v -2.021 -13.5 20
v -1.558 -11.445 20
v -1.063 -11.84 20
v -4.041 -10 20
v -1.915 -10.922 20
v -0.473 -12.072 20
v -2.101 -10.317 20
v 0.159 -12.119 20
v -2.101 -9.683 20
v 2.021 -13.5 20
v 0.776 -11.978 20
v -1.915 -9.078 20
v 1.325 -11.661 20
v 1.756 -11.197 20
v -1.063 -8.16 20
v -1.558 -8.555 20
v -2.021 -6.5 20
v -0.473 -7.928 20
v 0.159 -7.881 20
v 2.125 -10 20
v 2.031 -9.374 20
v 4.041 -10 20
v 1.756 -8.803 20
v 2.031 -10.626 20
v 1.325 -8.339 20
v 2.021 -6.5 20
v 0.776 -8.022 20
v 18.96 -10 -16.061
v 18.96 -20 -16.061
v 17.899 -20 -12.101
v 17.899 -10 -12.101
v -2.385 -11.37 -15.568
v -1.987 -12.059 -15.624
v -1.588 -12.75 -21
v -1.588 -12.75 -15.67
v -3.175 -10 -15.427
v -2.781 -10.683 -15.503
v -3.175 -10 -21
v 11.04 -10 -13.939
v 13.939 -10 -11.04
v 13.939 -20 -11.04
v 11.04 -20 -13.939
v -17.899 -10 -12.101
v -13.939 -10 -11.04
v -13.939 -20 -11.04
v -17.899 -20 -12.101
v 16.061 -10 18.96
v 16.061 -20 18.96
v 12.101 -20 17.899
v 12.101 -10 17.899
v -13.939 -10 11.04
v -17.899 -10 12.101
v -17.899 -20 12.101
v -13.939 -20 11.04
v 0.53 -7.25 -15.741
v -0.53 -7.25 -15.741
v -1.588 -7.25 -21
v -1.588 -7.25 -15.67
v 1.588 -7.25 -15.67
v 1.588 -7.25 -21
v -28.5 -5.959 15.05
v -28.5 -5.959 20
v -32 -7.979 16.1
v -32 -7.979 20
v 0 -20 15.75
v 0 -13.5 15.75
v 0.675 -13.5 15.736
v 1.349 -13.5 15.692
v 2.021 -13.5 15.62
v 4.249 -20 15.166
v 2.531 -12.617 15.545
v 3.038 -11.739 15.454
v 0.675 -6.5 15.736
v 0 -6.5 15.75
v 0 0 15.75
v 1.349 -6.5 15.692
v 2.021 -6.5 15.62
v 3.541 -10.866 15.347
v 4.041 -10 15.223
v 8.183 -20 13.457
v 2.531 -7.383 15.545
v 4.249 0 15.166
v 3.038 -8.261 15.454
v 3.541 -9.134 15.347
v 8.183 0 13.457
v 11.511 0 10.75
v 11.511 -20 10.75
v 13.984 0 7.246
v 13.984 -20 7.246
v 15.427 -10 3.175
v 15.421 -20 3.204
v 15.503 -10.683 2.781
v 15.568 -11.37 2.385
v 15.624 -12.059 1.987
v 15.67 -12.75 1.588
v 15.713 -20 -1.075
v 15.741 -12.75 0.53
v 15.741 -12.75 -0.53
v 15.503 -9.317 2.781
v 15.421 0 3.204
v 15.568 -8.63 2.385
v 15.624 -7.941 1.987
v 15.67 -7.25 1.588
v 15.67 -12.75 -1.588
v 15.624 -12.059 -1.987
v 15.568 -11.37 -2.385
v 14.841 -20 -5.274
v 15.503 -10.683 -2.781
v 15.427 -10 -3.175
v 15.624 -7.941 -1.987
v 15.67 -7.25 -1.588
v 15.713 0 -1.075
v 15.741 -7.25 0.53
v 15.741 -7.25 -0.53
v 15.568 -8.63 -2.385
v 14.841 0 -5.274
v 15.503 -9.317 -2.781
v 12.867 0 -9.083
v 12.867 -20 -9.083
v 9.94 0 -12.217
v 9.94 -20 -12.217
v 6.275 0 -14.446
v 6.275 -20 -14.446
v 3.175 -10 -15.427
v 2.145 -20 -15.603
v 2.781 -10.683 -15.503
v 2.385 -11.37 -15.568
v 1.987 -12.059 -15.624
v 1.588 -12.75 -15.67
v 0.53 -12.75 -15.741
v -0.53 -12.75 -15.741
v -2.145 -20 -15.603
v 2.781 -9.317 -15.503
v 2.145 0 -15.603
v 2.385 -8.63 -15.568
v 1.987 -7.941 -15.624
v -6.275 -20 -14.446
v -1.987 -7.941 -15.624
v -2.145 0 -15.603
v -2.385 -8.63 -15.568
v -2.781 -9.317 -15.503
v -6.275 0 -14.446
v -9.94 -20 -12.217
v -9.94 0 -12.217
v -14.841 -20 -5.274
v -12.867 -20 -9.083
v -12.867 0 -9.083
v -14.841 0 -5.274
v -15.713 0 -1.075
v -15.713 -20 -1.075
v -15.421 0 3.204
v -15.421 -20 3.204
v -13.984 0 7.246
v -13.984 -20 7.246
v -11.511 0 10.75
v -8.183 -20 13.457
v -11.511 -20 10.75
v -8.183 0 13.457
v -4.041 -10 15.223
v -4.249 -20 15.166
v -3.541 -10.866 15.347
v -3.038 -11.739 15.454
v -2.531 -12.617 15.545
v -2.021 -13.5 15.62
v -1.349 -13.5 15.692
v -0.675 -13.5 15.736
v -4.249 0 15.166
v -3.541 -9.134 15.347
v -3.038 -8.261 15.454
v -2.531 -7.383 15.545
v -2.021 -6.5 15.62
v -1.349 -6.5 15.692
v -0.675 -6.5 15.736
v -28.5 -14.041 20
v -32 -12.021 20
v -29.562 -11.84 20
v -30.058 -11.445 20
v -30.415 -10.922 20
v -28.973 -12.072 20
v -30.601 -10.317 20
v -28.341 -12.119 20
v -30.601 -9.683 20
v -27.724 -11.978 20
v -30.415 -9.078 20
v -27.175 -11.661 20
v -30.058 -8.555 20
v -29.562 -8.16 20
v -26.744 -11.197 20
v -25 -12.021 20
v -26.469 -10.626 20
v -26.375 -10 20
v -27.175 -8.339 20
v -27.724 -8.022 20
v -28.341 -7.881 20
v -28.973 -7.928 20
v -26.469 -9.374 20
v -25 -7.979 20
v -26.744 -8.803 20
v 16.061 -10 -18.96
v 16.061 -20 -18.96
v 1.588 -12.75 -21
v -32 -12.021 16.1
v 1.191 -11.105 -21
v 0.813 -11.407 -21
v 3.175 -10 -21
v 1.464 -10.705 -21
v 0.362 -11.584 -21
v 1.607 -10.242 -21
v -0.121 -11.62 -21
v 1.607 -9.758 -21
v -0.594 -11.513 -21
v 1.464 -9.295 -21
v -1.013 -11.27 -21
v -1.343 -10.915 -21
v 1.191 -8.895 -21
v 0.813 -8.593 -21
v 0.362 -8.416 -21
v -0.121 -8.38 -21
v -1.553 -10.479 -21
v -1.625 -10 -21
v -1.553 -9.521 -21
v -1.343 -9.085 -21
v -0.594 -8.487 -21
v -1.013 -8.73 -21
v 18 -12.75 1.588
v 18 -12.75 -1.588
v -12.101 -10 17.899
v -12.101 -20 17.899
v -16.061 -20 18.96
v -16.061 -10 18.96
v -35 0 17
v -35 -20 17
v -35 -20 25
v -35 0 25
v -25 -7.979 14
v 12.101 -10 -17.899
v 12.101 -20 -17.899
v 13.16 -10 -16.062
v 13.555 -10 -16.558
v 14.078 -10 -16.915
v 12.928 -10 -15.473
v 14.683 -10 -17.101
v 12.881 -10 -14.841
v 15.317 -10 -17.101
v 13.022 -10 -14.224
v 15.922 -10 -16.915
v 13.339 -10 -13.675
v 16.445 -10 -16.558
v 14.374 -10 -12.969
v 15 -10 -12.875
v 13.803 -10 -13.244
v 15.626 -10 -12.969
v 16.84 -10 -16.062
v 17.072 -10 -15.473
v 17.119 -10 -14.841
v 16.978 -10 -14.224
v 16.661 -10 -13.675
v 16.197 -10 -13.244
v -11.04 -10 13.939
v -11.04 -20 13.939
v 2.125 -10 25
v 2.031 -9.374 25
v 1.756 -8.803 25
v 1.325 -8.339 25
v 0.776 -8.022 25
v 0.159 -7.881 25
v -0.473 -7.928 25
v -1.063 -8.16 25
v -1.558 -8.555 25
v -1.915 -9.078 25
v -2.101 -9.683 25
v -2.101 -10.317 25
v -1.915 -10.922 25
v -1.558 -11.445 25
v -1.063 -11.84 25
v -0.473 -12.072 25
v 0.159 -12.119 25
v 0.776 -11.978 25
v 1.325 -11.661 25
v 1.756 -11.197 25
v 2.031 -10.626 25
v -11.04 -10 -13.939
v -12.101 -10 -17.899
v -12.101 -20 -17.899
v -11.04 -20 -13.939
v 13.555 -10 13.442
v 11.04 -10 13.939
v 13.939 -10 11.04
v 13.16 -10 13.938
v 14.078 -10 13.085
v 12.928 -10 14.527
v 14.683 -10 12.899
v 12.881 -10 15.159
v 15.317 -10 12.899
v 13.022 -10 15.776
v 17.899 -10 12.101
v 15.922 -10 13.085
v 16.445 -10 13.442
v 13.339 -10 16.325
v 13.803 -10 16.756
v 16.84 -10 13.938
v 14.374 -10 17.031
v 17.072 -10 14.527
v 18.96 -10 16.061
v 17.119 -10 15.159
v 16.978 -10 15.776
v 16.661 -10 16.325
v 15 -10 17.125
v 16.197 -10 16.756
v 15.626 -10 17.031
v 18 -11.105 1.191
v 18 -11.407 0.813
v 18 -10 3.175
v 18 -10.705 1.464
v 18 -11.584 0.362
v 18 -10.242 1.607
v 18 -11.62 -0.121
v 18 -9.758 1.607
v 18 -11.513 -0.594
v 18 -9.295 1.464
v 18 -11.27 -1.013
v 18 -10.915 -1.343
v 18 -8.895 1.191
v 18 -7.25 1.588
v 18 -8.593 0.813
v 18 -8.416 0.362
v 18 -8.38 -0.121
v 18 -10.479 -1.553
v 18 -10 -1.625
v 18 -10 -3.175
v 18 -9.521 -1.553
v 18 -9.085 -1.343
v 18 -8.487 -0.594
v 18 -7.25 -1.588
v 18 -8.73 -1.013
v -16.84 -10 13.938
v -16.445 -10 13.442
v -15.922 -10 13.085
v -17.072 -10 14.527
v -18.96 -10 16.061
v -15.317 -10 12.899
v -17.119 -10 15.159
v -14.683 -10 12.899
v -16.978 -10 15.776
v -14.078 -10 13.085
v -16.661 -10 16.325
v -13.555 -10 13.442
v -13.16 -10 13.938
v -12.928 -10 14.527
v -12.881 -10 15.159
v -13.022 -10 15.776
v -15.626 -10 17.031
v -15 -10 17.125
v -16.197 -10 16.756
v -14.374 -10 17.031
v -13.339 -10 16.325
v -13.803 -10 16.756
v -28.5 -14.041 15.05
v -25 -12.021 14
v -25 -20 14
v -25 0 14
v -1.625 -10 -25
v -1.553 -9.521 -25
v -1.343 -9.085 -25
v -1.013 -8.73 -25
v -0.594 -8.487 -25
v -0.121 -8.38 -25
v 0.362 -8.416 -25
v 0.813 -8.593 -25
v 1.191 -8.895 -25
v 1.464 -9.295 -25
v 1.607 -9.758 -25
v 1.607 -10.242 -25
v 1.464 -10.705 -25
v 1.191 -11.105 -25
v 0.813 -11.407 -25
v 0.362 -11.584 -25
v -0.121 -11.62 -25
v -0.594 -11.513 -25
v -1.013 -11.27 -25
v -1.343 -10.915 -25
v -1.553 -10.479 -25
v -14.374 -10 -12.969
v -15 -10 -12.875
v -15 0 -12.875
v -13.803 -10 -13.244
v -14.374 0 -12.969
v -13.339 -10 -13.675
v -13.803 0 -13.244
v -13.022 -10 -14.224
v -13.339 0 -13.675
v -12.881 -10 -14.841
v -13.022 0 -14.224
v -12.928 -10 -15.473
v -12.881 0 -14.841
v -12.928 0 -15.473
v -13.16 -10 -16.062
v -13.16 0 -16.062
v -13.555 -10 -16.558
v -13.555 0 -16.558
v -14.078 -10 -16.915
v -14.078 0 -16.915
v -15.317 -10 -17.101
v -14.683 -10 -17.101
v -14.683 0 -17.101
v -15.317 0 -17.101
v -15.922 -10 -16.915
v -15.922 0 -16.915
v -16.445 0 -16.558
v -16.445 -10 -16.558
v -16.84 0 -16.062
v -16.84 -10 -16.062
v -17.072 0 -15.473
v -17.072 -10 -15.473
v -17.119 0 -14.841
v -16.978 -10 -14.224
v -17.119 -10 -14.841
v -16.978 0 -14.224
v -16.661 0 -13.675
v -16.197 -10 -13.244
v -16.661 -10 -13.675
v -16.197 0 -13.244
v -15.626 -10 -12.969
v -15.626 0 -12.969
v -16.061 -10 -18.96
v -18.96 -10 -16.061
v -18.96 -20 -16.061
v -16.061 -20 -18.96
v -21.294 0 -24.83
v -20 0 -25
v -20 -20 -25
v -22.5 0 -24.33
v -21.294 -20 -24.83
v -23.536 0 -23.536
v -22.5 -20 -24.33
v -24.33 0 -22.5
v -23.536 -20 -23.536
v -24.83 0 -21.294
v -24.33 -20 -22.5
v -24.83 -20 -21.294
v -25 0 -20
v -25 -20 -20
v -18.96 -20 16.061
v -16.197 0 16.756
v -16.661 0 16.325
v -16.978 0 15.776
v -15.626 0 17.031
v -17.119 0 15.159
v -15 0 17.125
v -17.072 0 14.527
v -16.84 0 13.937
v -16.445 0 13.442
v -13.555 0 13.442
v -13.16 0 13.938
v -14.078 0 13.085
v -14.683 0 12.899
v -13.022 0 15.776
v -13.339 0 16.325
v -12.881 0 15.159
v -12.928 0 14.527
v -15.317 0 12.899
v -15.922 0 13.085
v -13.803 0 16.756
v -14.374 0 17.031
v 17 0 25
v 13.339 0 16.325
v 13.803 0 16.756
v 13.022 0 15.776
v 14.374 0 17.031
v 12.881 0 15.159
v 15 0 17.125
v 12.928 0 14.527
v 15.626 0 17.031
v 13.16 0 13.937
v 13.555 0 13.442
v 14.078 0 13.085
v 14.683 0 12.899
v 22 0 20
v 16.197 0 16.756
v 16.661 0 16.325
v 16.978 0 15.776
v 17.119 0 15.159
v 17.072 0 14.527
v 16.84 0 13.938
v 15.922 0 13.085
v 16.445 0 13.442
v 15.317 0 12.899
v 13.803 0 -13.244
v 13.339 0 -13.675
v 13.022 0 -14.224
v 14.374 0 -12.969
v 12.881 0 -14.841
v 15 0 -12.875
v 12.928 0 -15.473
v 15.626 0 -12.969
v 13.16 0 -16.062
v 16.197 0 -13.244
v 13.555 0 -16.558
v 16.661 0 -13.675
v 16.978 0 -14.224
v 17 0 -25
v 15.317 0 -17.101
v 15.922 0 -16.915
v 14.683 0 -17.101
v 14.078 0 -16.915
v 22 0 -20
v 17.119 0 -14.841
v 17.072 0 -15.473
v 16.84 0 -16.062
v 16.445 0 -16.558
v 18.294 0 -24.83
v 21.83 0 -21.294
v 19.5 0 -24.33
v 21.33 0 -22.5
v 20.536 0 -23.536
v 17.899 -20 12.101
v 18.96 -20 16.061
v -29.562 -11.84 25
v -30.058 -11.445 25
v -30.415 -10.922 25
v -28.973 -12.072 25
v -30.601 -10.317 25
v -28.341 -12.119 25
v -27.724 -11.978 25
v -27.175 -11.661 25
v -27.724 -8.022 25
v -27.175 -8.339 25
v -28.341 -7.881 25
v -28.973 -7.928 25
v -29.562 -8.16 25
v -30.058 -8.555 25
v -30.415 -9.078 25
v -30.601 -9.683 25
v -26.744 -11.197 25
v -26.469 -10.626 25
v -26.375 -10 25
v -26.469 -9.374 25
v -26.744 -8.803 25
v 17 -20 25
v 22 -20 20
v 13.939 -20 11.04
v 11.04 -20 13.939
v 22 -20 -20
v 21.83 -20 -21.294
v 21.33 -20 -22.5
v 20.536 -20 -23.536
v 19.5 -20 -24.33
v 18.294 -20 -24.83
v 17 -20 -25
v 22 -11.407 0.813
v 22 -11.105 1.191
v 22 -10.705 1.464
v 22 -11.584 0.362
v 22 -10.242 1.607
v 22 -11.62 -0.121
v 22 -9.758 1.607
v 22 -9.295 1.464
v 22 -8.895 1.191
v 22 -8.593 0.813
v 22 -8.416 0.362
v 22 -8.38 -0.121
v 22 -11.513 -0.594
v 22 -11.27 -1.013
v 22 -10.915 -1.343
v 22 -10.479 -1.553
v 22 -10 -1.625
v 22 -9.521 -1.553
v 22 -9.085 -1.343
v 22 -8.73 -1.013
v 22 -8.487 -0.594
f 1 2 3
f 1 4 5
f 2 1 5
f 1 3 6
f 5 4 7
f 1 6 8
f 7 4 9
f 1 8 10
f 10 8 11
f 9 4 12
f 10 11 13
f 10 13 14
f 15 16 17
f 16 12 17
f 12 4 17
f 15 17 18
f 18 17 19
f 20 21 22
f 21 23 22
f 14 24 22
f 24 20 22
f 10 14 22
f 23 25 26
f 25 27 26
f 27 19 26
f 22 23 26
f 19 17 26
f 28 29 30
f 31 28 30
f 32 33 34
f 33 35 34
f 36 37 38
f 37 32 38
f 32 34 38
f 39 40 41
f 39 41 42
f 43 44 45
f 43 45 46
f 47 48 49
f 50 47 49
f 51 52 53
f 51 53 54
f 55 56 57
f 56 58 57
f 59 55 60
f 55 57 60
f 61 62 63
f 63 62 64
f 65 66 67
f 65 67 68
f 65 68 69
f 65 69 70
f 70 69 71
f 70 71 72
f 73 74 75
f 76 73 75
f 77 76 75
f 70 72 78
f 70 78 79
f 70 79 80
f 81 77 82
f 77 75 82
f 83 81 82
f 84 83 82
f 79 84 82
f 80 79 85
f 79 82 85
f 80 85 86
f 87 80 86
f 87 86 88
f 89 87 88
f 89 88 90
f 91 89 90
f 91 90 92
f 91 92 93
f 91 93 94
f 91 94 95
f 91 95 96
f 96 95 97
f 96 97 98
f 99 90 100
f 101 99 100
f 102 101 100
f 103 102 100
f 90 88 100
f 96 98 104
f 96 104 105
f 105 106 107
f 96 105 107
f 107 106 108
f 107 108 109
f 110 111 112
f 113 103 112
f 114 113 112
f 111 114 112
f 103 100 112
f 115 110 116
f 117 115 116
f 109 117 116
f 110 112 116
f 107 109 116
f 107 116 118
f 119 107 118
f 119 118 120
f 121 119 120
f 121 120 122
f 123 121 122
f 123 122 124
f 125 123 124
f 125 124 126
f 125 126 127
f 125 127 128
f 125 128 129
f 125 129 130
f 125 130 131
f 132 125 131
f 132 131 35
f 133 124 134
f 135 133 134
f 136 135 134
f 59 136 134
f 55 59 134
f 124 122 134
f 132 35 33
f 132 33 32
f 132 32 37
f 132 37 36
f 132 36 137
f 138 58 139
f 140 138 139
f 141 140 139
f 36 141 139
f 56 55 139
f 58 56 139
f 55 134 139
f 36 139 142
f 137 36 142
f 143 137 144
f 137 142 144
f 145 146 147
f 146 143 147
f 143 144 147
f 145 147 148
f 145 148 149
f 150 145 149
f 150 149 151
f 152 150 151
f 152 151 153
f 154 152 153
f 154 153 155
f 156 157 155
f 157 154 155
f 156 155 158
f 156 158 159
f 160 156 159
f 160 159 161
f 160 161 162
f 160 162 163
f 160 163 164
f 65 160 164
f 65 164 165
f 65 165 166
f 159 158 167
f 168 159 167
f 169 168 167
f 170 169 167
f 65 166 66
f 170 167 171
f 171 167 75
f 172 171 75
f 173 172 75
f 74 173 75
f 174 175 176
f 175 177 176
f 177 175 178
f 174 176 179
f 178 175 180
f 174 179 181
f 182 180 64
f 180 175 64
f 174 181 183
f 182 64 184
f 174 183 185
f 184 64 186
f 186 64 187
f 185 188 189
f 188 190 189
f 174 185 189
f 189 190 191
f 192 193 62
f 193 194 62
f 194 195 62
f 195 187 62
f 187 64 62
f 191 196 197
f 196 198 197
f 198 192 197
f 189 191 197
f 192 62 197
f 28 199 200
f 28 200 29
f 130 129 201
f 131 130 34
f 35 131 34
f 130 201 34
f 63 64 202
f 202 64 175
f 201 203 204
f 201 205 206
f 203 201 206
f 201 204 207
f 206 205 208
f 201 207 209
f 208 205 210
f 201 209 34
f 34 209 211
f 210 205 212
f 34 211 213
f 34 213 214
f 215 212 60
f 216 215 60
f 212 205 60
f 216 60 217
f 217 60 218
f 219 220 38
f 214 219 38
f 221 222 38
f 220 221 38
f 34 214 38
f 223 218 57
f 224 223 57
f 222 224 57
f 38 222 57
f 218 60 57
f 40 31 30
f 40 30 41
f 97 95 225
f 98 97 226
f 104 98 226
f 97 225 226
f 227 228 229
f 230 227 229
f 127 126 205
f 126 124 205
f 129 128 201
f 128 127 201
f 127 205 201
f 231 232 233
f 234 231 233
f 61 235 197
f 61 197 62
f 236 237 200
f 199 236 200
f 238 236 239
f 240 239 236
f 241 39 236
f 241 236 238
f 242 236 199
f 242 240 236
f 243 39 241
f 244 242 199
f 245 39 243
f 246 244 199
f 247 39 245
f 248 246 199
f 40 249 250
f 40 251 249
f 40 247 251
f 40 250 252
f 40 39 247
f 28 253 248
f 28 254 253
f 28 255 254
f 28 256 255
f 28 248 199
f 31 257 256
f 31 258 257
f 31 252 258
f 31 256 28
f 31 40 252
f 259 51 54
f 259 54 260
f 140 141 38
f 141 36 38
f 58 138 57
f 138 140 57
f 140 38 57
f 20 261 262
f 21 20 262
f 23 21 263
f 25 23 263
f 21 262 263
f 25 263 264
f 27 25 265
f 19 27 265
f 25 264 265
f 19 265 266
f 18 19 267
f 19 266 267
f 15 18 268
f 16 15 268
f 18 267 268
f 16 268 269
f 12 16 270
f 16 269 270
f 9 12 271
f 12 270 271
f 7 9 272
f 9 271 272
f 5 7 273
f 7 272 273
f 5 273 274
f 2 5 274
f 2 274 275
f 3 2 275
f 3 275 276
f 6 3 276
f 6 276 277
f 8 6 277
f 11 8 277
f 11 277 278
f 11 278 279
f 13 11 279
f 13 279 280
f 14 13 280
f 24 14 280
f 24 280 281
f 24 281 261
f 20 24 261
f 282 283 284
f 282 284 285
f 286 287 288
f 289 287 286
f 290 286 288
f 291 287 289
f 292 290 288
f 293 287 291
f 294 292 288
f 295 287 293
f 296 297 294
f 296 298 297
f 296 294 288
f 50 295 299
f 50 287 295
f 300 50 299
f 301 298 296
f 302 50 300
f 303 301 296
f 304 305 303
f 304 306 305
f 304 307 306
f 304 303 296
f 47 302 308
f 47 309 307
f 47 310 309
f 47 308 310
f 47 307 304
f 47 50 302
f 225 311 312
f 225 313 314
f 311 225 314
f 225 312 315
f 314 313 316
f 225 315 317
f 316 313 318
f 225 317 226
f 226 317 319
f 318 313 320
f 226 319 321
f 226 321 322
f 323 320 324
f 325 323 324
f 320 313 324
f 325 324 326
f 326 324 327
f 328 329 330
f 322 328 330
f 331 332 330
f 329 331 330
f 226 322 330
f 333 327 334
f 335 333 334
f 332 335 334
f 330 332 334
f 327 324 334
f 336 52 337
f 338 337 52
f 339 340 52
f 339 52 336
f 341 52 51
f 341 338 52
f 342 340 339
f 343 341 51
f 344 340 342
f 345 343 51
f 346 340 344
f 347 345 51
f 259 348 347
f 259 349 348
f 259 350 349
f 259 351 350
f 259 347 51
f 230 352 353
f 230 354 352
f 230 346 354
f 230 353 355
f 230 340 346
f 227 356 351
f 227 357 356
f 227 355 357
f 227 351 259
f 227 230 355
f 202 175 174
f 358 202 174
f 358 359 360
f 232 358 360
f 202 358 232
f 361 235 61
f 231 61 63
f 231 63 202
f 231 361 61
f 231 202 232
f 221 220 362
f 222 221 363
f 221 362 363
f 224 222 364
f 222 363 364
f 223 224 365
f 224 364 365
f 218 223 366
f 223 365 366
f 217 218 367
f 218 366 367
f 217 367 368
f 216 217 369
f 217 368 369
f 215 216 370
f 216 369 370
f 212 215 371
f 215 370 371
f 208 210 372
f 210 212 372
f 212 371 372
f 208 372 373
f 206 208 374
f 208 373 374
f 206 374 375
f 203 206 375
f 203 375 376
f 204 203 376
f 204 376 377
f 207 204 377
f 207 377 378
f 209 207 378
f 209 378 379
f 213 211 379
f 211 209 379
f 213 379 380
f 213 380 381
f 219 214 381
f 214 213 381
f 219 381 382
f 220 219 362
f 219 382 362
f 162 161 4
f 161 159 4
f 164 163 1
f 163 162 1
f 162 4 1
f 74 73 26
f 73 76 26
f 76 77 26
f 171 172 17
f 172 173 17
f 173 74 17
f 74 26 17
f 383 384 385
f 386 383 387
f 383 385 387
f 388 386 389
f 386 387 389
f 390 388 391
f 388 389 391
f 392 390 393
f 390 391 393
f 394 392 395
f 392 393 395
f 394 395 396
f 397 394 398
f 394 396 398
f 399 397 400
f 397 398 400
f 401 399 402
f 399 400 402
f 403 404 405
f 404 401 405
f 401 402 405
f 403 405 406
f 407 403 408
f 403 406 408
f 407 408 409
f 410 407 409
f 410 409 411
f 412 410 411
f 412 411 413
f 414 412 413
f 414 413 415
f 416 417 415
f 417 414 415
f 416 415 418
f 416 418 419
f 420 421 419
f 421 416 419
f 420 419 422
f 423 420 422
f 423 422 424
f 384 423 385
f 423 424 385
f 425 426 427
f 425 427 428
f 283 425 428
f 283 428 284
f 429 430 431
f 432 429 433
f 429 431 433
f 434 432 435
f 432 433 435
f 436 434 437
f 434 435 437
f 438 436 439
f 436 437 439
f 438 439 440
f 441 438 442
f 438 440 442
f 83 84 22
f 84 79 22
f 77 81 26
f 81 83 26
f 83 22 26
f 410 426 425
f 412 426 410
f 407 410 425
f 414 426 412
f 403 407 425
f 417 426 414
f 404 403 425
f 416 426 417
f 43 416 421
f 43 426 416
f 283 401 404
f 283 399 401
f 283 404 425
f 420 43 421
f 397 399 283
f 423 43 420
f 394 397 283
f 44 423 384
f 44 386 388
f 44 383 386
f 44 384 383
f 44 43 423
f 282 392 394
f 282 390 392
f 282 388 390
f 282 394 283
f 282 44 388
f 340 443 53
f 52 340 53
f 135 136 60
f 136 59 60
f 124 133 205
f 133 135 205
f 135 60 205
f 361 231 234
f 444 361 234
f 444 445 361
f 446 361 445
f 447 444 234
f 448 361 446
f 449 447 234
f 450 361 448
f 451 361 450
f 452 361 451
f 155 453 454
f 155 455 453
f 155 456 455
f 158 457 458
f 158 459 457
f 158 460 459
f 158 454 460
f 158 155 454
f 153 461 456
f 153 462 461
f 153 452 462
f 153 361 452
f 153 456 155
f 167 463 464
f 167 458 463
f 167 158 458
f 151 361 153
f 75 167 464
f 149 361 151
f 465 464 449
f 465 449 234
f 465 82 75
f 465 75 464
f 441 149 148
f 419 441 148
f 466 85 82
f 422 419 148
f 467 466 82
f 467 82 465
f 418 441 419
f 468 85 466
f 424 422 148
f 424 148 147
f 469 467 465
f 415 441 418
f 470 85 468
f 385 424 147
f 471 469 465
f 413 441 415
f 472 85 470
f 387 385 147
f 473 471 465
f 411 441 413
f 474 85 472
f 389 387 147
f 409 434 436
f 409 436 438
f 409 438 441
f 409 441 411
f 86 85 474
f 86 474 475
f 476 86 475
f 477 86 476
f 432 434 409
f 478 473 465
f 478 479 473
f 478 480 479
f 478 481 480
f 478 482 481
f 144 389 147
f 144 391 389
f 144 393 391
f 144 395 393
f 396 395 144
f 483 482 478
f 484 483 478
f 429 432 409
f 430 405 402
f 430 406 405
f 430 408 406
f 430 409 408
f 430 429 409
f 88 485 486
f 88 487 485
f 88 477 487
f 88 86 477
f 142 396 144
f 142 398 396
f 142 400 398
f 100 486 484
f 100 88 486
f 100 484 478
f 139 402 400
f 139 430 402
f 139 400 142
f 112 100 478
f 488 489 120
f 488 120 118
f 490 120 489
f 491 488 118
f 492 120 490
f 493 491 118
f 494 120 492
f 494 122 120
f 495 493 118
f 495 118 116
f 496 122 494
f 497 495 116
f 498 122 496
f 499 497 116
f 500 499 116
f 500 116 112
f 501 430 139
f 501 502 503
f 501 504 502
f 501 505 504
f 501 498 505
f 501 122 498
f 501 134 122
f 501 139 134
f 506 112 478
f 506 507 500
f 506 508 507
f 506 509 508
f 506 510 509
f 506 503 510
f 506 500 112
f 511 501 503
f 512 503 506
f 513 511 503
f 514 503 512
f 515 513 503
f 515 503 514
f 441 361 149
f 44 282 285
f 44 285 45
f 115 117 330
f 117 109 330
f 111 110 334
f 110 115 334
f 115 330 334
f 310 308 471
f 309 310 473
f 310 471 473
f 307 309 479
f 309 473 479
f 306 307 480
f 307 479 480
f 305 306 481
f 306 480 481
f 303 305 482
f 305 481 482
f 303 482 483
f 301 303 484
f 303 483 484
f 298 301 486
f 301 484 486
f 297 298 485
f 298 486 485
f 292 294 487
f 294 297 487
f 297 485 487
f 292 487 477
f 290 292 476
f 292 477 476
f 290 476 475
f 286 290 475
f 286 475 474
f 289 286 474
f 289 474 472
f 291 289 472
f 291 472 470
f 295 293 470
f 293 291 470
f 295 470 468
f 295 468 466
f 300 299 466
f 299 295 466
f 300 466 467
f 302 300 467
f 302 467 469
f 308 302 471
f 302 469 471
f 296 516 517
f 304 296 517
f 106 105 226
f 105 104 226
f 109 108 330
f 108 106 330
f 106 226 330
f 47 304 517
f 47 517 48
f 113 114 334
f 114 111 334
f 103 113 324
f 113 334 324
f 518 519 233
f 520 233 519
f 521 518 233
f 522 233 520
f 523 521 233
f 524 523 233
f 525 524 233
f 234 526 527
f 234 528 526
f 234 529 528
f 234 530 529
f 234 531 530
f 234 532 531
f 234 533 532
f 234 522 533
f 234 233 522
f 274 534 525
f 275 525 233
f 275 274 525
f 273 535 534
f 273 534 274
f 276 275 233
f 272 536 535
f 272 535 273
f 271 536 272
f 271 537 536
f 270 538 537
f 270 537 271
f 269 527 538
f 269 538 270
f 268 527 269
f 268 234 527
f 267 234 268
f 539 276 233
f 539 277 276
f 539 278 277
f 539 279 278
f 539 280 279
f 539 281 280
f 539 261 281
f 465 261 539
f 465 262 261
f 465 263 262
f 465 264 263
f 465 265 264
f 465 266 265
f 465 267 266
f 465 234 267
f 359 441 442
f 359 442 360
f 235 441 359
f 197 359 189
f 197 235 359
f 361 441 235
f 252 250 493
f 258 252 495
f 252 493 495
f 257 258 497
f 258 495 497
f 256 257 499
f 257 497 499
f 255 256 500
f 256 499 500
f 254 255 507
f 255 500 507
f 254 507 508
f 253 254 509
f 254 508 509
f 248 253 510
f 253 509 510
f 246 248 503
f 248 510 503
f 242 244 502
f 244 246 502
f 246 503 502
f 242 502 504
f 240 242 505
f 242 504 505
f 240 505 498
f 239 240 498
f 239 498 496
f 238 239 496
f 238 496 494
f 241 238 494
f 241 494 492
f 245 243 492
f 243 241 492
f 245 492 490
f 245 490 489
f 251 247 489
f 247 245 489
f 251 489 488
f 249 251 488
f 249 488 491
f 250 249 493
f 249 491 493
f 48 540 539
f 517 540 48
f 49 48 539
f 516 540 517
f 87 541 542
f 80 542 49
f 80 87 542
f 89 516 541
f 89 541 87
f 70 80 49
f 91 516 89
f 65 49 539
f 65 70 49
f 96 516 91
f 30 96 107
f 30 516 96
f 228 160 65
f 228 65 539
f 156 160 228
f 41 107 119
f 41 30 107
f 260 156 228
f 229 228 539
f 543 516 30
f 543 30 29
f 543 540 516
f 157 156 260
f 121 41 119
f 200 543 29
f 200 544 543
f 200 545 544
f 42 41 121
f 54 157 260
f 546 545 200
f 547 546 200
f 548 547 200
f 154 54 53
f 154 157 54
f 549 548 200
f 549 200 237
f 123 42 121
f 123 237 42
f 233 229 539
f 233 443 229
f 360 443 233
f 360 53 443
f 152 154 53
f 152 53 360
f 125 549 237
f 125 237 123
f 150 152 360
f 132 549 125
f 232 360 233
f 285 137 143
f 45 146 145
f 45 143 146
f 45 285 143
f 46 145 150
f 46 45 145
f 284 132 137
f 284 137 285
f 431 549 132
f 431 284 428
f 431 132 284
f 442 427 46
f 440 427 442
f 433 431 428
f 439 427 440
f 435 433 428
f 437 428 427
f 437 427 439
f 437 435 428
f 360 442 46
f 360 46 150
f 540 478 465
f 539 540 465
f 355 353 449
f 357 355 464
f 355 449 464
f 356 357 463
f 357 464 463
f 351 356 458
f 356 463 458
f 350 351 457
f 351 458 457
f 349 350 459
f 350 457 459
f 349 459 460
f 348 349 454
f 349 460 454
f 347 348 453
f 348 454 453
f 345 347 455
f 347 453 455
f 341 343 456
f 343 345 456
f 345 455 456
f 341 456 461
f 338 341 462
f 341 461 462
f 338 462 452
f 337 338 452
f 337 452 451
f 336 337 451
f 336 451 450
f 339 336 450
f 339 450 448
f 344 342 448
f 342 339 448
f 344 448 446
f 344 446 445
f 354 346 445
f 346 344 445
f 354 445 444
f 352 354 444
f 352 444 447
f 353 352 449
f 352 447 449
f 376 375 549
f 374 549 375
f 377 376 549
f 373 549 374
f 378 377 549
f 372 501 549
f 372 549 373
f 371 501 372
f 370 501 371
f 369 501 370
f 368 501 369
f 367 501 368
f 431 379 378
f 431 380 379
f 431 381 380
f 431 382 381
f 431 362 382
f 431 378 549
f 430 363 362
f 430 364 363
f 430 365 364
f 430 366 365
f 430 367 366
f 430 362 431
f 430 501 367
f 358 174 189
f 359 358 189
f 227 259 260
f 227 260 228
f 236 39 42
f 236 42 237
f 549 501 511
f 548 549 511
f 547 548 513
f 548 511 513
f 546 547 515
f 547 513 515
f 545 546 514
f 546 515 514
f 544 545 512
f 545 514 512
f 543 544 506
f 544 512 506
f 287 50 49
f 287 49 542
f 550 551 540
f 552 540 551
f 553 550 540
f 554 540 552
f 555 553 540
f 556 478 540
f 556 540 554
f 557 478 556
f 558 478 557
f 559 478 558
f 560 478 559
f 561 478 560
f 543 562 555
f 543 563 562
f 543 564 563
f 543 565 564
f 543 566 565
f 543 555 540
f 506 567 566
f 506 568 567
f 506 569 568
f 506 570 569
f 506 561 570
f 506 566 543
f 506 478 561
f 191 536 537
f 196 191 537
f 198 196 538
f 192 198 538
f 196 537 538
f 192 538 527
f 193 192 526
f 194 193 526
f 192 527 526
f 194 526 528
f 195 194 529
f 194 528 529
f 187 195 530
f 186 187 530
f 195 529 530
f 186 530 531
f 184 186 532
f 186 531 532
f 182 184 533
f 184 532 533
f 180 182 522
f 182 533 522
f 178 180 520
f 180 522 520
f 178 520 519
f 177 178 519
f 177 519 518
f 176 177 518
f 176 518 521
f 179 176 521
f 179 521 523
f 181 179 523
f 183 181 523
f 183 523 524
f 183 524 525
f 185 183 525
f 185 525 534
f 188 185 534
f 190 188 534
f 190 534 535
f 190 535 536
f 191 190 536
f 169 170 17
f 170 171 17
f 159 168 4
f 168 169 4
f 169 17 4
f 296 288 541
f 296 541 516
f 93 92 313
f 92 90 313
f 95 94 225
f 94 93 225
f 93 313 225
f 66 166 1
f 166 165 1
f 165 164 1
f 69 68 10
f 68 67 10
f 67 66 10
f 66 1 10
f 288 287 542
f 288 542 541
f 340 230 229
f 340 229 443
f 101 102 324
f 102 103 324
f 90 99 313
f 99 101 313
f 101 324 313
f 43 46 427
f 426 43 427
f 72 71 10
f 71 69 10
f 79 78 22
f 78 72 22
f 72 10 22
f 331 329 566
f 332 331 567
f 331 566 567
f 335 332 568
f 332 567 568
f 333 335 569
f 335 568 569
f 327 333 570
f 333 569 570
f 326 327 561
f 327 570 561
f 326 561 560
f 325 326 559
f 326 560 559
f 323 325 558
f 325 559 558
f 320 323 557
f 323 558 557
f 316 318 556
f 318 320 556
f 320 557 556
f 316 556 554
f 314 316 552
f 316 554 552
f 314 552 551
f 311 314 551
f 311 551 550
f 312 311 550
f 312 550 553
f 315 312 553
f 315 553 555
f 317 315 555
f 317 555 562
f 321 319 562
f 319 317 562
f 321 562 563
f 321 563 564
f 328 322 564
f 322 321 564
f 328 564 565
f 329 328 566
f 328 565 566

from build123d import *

# Parameters (mm, degrees)
CROQUIS1_R               = 2.125
CROQUIS1_R_2             = 15.75
SALIENTE_EXTRUIR1_DEPTH  = 20
CORTAR_EXTRUIR1_REACH    = 66.226
CROQUIS3_R               = 2.125
CORTAR_EXTRUIR2_REACH    = 71.226
CORTAR_EXTRUIR2_START    = -5
CORTAR_EXTRUIR3_DEPTH    = 10
SKETCH1_W                = 3
SKETCH1_H                = 60
CUT_EXTRUDE1_DEPTH       = 48.434164903
REDONDEO1_R              = 5
CUT_EXTRUDE2_DEPTH       = 48.434164903
SKETCH3_R                = 1.625
CUT_EXTRUDE3_DEPTH       = 10
CUT_EXTRUDE4_REACH       = 71.376
CUT_EXTRUDE4_END_RADIUS  = 15.75
CUT_EXTRUDE4_START       = -4
CUT_EXTRUDE5_REACH       = 66.226
CUT_EXTRUDE5_END_RADIUS  = 15.75
SKETCH5_R                = 1.625
CUT_EXTRUDE6_REACH       = 70.226
CUT_EXTRUDE6_END_RADIUS  = 15.75
CUT_EXTRUDE6_START       = -4
REDONDEO1_OF_SIMETR_A1_R = 5
CROQUIS6_W               = 57
CROQUIS6_H               = 20
CORTAR_EXTRUIR4_DEPTH    = 73.972597597
CROQUIS7_W               = 57
CROQUIS7_H               = 20
CORTAR_EXTRUIR5_DEPTH    = 73.972597597


with BuildPart() as part:
    # Croquis1 → Saliente-Extruir1 (new body)
    with BuildSketch(Plane(origin=(0, 0, 0), x_dir=(1, 0, 0), z_dir=(0, 1, 0))):
        Polygon((25, 25), (-25, 25), (-25, -14), (-35, -17), (-35, -25), (25, -25), align=None)
        with Locations(Location((-15, -15, 0), (0, 0, 270))):
            Circle(CROQUIS1_R, mode=Mode.SUBTRACT)
        with Locations(Location((15, -15, 0), (0, 0, 270))):
            Circle(CROQUIS1_R, mode=Mode.SUBTRACT)
        with Locations(Location((-15, 15, 0), (0, 0, 270))):
            Circle(CROQUIS1_R, mode=Mode.SUBTRACT)
        with Locations(Location((0, 0, 0), (0, 0, 270))):
            Circle(CROQUIS1_R_2, mode=Mode.SUBTRACT)
        with Locations(Location((15, 15, 0), (0, 0, 270))):
            Circle(CROQUIS1_R, mode=Mode.SUBTRACT)
    saliente_extruir1 = extrude(amount=-SALIENTE_EXTRUIR1_DEPTH)

    # Croquis3 → Cortar-Extruir1 (cut, up to next)
    with BuildSketch(Plane.XY.offset(25), mode=Mode.PRIVATE) as cortar_extruir1_sk1:
        with Locations((-28.5, -10)):
            Circle(CROQUIS3_R)
    cortar_extruir1_tool1 = extrude(cortar_extruir1_sk1.sketch, amount=-CORTAR_EXTRUIR1_REACH, mode=Mode.PRIVATE) & part.part
    # Croquis3 → Cortar-Extruir1 (cut, up to next)
    with BuildSketch(Plane.XY.offset(25), mode=Mode.PRIVATE) as cortar_extruir1_sk2:
        with Locations((0, -10)):
            Circle(CROQUIS3_R)
    cortar_extruir1_tool2 = extrude(cortar_extruir1_sk2.sketch, amount=-CORTAR_EXTRUIR1_REACH, mode=Mode.PRIVATE) & part.part
    cortar_extruir1_1 = cortar_extruir1_tool1.solids().sort_by_distance((-28.5, -10, 25))[0]
    add(cortar_extruir1_1, mode=Mode.SUBTRACT)
    cortar_extruir1_2 = cortar_extruir1_tool2.solids().sort_by_distance((0, -10, 25))[0]
    add(cortar_extruir1_2, mode=Mode.SUBTRACT)
    cortar_extruir1 = cortar_extruir1_1 + cortar_extruir1_2  # Cortar-Extruir1 as one shape, for the pattern or mirror that repeats it

    # Croquis4 → Cortar-Extruir2 (cut, up to next)
    with BuildSketch(Plane.XY.offset(25).offset(CORTAR_EXTRUIR2_START), mode=Mode.PRIVATE) as cortar_extruir2_sk1:
        Polygon((-28.5, -14.041451884), (-25, -12.020725942), (-25, -7.979274058), (-28.5, -5.958548116), (-32, -7.979274058), (-32, -12.020725942), align=None)
    cortar_extruir2_tool1 = extrude(cortar_extruir2_sk1.sketch, amount=-CORTAR_EXTRUIR2_REACH, mode=Mode.PRIVATE) & part.part
    # Croquis4 → Cortar-Extruir2 (cut, up to next)
    with BuildSketch(Plane.XY.offset(25).offset(CORTAR_EXTRUIR2_START), mode=Mode.PRIVATE) as cortar_extruir2_sk2:
        Polygon((2.020725942, -13.5), (4.041451884, -10), (2.020725942, -6.5), (-2.020725942, -6.5), (-4.041451884, -10), (-2.020725942, -13.5), align=None)
    cortar_extruir2_tool2 = extrude(cortar_extruir2_sk2.sketch, amount=-CORTAR_EXTRUIR2_REACH, mode=Mode.PRIVATE) & part.part
    cortar_extruir2_1 = cortar_extruir2_tool1.solids().sort_by_distance((-28.5, -10, 20))[0]
    add(cortar_extruir2_1, mode=Mode.SUBTRACT)
    cortar_extruir2_2 = cortar_extruir2_tool2.solids().sort_by_distance((0, -10, 20))[0]
    add(cortar_extruir2_2, mode=Mode.SUBTRACT)
    cortar_extruir2 = cortar_extruir2_1 + cortar_extruir2_2  # Cortar-Extruir2 as one shape, for the pattern or mirror that repeats it

    # Croquis5 → Cortar-Extruir3 (cut)
    with BuildSketch(Plane.XZ.offset(20)):
        Polygon((-11.040489496, 13.939052358), (-12.101437138, 17.898562862), (-16.060947642, 18.959510504), (-18.959510504, 16.060947642), (-17.898562862, 12.101437138), (-13.939052358, 11.040489496), align=None)
        Polygon((11.040489496, 13.939052358), (13.939052358, 11.040489496), (17.898562862, 12.101437138), (18.959510504, 16.060947642), (16.060947642, 18.959510504), (12.101437138, 17.898562862), align=None)
        Polygon((-13.939052358, -11.040489496), (-17.898562862, -12.101437138), (-18.959510504, -16.060947642), (-16.060947642, -18.959510504), (-12.101437138, -17.898562862), (-11.040489496, -13.939052358), align=None)
        Polygon((18.959510504, -16.060947642), (17.898562862, -12.101437138), (13.939052358, -11.040489496), (11.040489496, -13.939052358), (12.101437138, -17.898562862), (16.060947642, -18.959510504), align=None)
    cortar_extruir3 = extrude(amount=-CORTAR_EXTRUIR3_DEPTH, mode=Mode.SUBTRACT)

    # Sketch1 → Cut-Extrude1 (cut, through all)
    with BuildSketch(Plane(origin=(0, 0, 0), x_dir=(1, 0, 0), z_dir=(0, 1, 0))):
        with Locations((23.5, 5)):
            Rectangle(SKETCH1_W, SKETCH1_H)
    cut_extrude1 = extrude(amount=-CUT_EXTRUDE1_DEPTH, mode=Mode.SUBTRACT)

    # Redondeo1
    redondeo1_edges = [part.edges().sort_by_distance(p)[0] for p in [
        (22, -10, -25),
        (-25, -10, -25),
    ]]
    fillet(redondeo1_edges, radius=REDONDEO1_R)

    # Sketch2 → Cut-Extrude2 (cut, through all)
    with BuildSketch(Plane(origin=(0, 0, 0), x_dir=(1, 0, 0), z_dir=(0, 1, 0))):
        Polygon((22, -25), (22, -20), (17, -25), align=None)
    cut_extrude2 = extrude(amount=-CUT_EXTRUDE2_DEPTH, mode=Mode.SUBTRACT)

    # Sketch3 → Cut-Extrude3 (cut)
    with BuildSketch(Plane(origin=(22, 0, 0), x_dir=(0, 0, -1), z_dir=(1, 0, 0))):
        with Locations((0, -10)):
            Circle(SKETCH3_R)
    cut_extrude3 = extrude(amount=-CUT_EXTRUDE3_DEPTH, mode=Mode.SUBTRACT)

    # Cut-Extrude4: up to this cylinder (the profile starts outside it)
    cut_extrude4_end = Plane(origin=(0, -10, 0), z_dir=(0, 1, 0)) * Cylinder(CUT_EXTRUDE4_END_RADIUS, 175.252, mode=Mode.PRIVATE)
    # Sketch4 → Cut-Extrude4 (cut, up to the surface)
    with BuildSketch(Plane(origin=(22, 0, 0), x_dir=(0, 0, -1), z_dir=(1, 0, 0)).offset(CUT_EXTRUDE4_START), mode=Mode.PRIVATE) as cut_extrude4_sk1:
        Polygon((1.58771324, -12.75), (3.175426481, -10), (1.58771324, -7.25), (-1.58771324, -7.25), (-3.175426481, -10), (-1.58771324, -12.75), align=None)
    cut_extrude4_tool1 = extrude(cut_extrude4_sk1.sketch, amount=-CUT_EXTRUDE4_REACH, mode=Mode.PRIVATE) - cut_extrude4_end
    cut_extrude4 = cut_extrude4_tool1.solids().sort_by_distance((18, -10, 0))[0]
    add(cut_extrude4, mode=Mode.SUBTRACT)

    # Cut-Extrude5: up to this cylinder (the profile starts outside it)
    cut_extrude5_end = Plane(origin=(0, -10, 0), z_dir=(0, 1, 0)) * Cylinder(CUT_EXTRUDE5_END_RADIUS, 164.952, mode=Mode.PRIVATE)
    # Sketch5 → Cut-Extrude5 (cut, up to the surface)
    with BuildSketch(Plane(origin=(0, 0, -25), x_dir=(-1, 0, 0), z_dir=(0, 0, -1)), mode=Mode.PRIVATE) as cut_extrude5_sk1:
        with Locations((0, -10)):
            Circle(SKETCH5_R)
    cut_extrude5_tool1 = extrude(cut_extrude5_sk1.sketch, amount=-CUT_EXTRUDE5_REACH, mode=Mode.PRIVATE) - cut_extrude5_end
    cut_extrude5 = cut_extrude5_tool1.solids().sort_by_distance((0, -10, -25))[0]
    add(cut_extrude5, mode=Mode.SUBTRACT)

    # Cut-Extrude6: up to this cylinder (the profile starts outside it)
    cut_extrude6_end = Plane(origin=(0, -10, 0), z_dir=(0, 1, 0)) * Cylinder(CUT_EXTRUDE6_END_RADIUS, 172.952, mode=Mode.PRIVATE)
    # Sketch6 → Cut-Extrude6 (cut, up to the surface)
    with BuildSketch(Plane(origin=(0, 0, -25), x_dir=(-1, 0, 0), z_dir=(0, 0, -1)).offset(CUT_EXTRUDE6_START), mode=Mode.PRIVATE) as cut_extrude6_sk1:
        Polygon((1.58771324, -12.75), (3.175426481, -10), (1.58771324, -7.25), (-1.58771324, -7.25), (-3.175426481, -10), (-1.58771324, -12.75), align=None)
    cut_extrude6_tool1 = extrude(cut_extrude6_sk1.sketch, amount=-CUT_EXTRUDE6_REACH, mode=Mode.PRIVATE) - cut_extrude6_end
    cut_extrude6 = cut_extrude6_tool1.solids().sort_by_distance((0, -10, -21))[0]
    add(cut_extrude6, mode=Mode.SUBTRACT)

    # Simetría1: Saliente-Extruir1, Cortar-Extruir1, Cortar-Extruir2, Cortar-Extruir3, Cut-Extrude1, Cut-Extrude2, Cut-Extrude3, Cut-Extrude4, Cut-Extrude5, Cut-Extrude6 across plane
    add(saliente_extruir1.mirror(Plane.ZX.offset(-20)))
    add(cortar_extruir1.mirror(Plane.ZX.offset(-20)), mode=Mode.SUBTRACT)
    add(cortar_extruir2.mirror(Plane.ZX.offset(-20)), mode=Mode.SUBTRACT)
    add(cortar_extruir3.mirror(Plane.ZX.offset(-20)), mode=Mode.SUBTRACT)
    add(cut_extrude1.mirror(Plane.ZX.offset(-20)), mode=Mode.SUBTRACT)
    add(cut_extrude2.mirror(Plane.ZX.offset(-20)), mode=Mode.SUBTRACT)
    add(cut_extrude3.mirror(Plane.ZX.offset(-20)), mode=Mode.SUBTRACT)
    add(cut_extrude4.mirror(Plane.ZX.offset(-20)), mode=Mode.SUBTRACT)
    add(cut_extrude5.mirror(Plane.ZX.offset(-20)), mode=Mode.SUBTRACT)
    add(cut_extrude6.mirror(Plane.ZX.offset(-20)), mode=Mode.SUBTRACT)

    # Redondeo1 of Simetría1
    redondeo1_of_simetr_a1_edges = [part.edges().sort_by_distance(p)[0] for p in [
        (22, -30, -25),
        (-25, -30, -25),
    ]]
    fillet(redondeo1_of_simetr_a1_edges, radius=REDONDEO1_OF_SIMETR_A1_R)

    # Croquis6 → Cortar-Extruir4 (cut, through all)
    with BuildSketch(Plane(origin=(0, 0, -25), x_dir=(-1, 0, 0), z_dir=(0, 0, -1))):
        with Locations((6.5, -10)):
            Rectangle(CROQUIS6_W, CROQUIS6_H)
    extrude(amount=-CORTAR_EXTRUIR4_DEPTH, mode=Mode.SUBTRACT)

    # Simetría4: part across plane


with BuildPart() as part_1:
    add(part.part)
    add(part.part.mirror(Plane(origin=(22, -20, 25), x_dir=(0, 0, 1), z_dir=(0, -1, 0))))

    # Croquis7 → Cortar-Extruir5 (cut, through all)
    with BuildSketch(Plane(origin=(0, 0, -25), x_dir=(-1, 0, 0), z_dir=(0, 0, -1))):
        with Locations((6.5, -30)):
            Rectangle(CROQUIS7_W, CROQUIS7_H)
    extrude(amount=-CORTAR_EXTRUIR5_DEPTH, mode=Mode.SUBTRACT)


solid = part_1.part
